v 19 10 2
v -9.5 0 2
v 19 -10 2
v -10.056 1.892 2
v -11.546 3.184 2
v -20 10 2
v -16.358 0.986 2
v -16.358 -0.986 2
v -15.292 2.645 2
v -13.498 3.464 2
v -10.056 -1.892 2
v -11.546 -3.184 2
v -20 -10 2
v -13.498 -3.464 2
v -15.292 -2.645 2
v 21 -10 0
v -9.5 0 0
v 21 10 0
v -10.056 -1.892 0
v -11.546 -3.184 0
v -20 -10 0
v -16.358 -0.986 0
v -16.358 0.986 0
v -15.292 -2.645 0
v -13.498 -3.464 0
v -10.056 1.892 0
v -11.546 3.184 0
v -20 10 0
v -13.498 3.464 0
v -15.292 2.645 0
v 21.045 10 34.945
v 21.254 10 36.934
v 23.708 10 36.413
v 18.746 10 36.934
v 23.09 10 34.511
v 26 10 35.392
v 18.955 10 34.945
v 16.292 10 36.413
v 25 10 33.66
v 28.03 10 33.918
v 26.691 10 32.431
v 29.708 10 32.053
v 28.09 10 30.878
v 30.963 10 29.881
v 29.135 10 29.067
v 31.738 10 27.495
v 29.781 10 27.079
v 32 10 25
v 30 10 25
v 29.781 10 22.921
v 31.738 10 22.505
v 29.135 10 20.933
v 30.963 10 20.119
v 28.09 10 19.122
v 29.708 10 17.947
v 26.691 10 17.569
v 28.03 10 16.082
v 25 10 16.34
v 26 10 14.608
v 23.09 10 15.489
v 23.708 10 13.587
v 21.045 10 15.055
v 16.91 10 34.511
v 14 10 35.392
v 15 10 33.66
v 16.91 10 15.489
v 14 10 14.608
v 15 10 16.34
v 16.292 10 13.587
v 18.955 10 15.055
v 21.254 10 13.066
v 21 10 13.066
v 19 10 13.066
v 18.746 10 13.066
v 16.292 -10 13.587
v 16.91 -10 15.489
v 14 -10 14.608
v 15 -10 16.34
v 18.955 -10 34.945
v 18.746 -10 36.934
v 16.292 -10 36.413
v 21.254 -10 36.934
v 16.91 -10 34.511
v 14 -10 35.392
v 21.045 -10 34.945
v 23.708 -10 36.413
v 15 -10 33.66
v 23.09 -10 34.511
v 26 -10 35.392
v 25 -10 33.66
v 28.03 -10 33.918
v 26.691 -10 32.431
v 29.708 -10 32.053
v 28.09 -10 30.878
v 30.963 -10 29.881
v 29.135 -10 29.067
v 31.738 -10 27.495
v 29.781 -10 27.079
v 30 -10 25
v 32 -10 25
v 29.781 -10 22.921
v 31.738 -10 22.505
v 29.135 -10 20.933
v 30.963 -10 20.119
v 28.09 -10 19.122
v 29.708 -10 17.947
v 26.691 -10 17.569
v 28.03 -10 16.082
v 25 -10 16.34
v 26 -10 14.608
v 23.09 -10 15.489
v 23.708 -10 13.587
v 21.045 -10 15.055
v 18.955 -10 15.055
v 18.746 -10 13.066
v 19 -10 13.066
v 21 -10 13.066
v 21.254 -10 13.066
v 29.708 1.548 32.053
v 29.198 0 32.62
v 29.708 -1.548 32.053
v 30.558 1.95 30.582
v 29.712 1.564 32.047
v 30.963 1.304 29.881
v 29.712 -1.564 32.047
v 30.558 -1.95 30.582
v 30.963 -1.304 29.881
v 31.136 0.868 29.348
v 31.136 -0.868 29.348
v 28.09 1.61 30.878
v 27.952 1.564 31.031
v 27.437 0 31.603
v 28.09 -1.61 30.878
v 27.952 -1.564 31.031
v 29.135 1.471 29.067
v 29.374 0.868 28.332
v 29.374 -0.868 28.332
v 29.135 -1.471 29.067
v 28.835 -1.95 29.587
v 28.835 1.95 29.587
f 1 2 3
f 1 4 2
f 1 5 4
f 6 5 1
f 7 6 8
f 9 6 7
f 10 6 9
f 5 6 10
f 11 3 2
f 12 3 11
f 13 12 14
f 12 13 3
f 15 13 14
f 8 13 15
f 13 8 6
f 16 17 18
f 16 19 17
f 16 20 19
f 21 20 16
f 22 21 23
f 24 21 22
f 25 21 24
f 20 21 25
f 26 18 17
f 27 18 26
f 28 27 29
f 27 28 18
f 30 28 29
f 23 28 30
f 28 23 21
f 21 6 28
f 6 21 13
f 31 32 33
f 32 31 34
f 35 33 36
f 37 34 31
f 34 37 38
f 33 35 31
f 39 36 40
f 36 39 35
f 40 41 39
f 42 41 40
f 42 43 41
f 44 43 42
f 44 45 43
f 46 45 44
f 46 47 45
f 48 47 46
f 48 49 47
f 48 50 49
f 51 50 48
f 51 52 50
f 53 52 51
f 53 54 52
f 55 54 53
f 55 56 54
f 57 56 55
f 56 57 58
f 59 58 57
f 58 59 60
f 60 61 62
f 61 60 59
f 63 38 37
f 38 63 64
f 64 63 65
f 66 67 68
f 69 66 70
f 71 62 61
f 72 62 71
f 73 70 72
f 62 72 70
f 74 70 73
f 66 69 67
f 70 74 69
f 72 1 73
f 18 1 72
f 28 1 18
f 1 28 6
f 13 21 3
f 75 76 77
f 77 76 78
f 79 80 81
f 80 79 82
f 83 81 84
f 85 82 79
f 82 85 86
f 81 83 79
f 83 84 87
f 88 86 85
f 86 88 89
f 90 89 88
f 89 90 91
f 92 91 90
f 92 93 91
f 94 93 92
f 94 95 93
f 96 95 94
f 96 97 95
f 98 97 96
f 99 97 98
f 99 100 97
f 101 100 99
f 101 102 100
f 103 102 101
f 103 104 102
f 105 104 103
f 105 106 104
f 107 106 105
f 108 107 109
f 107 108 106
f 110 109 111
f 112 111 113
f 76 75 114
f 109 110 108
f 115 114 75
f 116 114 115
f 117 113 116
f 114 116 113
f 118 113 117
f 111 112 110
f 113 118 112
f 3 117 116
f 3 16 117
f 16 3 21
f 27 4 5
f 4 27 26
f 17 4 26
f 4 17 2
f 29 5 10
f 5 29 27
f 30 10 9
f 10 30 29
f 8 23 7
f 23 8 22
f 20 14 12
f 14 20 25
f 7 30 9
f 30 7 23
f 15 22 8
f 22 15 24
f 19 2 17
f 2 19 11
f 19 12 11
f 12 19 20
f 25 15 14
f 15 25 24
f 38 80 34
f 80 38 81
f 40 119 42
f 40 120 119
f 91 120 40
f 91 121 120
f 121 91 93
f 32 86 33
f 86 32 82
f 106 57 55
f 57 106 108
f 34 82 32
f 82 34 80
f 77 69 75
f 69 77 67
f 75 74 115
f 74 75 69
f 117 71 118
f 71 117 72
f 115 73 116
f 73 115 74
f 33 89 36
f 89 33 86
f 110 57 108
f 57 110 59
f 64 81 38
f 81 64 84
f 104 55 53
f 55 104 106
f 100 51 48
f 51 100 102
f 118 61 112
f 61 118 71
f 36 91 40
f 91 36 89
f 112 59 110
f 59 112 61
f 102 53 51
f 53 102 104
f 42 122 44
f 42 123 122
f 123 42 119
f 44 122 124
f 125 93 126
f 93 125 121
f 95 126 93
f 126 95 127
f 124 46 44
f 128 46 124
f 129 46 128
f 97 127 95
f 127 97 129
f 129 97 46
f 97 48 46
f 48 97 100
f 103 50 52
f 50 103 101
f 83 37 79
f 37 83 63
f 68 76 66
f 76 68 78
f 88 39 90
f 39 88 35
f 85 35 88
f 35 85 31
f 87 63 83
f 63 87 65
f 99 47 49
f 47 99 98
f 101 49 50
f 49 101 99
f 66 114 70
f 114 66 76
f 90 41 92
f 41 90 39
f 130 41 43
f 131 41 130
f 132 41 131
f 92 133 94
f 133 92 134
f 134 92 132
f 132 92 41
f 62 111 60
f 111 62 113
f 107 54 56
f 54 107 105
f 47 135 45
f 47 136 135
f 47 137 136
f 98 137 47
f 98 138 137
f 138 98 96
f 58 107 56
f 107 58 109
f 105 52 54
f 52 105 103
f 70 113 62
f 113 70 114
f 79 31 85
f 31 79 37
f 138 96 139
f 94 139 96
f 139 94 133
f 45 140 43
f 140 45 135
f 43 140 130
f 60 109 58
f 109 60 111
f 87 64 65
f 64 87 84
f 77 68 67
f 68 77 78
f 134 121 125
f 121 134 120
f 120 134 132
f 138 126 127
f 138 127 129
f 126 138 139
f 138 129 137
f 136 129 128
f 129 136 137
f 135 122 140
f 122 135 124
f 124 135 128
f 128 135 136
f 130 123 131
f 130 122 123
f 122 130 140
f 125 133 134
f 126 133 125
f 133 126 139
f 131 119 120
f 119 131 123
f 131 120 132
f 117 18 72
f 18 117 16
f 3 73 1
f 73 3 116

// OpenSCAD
union() {
	difference() {
		translate(v = [0, 0, 1.0000000000]) {
			cube(center = true, size = [40, 20, 2]);
		}
		translate(v = [-13.0000000000, 0, 0]) {
			translate(v = [0, 0, -2]) {
				cylinder(d = 7, h = 10);
			}
		}
	}
	translate(v = [20.0000000000, 0, 0]) {
		translate(v = [0, 0, 7.5000000000]) {
			cube(center = true, size = [2, 20, 15]);
		}
	}
	translate(v = [0, 0, 15]) {
		translate(v = [0, 10.0000000000, 0]) {
			translate(v = [0, 0, 10.0000000000]) {
				translate(v = [20.0000000000, 0, 0]) {
					rotate(a = [90, 0, 0]) {
						rotate(a = [0, 0, 120]) {
							difference() {
								cylinder(d = 24, h = 20);
								translate(v = [0, 0, -10.0000000000]) {
									cylinder(d = 20, h = 40);
								}
								rotate_extrude(angle = 120) {
									translate(v = [0, 0, -10.0000000000]) {
										square(size = [24, 40]);
									}
								}
								translate(v = [0, 0, 10.0000000000]) {
									rotate(a = [90, 0, 0]) {
										cylinder(d = 4, h = 25);
									}
								}
							}
						}
					}
				}
			}
		}
	}
}
